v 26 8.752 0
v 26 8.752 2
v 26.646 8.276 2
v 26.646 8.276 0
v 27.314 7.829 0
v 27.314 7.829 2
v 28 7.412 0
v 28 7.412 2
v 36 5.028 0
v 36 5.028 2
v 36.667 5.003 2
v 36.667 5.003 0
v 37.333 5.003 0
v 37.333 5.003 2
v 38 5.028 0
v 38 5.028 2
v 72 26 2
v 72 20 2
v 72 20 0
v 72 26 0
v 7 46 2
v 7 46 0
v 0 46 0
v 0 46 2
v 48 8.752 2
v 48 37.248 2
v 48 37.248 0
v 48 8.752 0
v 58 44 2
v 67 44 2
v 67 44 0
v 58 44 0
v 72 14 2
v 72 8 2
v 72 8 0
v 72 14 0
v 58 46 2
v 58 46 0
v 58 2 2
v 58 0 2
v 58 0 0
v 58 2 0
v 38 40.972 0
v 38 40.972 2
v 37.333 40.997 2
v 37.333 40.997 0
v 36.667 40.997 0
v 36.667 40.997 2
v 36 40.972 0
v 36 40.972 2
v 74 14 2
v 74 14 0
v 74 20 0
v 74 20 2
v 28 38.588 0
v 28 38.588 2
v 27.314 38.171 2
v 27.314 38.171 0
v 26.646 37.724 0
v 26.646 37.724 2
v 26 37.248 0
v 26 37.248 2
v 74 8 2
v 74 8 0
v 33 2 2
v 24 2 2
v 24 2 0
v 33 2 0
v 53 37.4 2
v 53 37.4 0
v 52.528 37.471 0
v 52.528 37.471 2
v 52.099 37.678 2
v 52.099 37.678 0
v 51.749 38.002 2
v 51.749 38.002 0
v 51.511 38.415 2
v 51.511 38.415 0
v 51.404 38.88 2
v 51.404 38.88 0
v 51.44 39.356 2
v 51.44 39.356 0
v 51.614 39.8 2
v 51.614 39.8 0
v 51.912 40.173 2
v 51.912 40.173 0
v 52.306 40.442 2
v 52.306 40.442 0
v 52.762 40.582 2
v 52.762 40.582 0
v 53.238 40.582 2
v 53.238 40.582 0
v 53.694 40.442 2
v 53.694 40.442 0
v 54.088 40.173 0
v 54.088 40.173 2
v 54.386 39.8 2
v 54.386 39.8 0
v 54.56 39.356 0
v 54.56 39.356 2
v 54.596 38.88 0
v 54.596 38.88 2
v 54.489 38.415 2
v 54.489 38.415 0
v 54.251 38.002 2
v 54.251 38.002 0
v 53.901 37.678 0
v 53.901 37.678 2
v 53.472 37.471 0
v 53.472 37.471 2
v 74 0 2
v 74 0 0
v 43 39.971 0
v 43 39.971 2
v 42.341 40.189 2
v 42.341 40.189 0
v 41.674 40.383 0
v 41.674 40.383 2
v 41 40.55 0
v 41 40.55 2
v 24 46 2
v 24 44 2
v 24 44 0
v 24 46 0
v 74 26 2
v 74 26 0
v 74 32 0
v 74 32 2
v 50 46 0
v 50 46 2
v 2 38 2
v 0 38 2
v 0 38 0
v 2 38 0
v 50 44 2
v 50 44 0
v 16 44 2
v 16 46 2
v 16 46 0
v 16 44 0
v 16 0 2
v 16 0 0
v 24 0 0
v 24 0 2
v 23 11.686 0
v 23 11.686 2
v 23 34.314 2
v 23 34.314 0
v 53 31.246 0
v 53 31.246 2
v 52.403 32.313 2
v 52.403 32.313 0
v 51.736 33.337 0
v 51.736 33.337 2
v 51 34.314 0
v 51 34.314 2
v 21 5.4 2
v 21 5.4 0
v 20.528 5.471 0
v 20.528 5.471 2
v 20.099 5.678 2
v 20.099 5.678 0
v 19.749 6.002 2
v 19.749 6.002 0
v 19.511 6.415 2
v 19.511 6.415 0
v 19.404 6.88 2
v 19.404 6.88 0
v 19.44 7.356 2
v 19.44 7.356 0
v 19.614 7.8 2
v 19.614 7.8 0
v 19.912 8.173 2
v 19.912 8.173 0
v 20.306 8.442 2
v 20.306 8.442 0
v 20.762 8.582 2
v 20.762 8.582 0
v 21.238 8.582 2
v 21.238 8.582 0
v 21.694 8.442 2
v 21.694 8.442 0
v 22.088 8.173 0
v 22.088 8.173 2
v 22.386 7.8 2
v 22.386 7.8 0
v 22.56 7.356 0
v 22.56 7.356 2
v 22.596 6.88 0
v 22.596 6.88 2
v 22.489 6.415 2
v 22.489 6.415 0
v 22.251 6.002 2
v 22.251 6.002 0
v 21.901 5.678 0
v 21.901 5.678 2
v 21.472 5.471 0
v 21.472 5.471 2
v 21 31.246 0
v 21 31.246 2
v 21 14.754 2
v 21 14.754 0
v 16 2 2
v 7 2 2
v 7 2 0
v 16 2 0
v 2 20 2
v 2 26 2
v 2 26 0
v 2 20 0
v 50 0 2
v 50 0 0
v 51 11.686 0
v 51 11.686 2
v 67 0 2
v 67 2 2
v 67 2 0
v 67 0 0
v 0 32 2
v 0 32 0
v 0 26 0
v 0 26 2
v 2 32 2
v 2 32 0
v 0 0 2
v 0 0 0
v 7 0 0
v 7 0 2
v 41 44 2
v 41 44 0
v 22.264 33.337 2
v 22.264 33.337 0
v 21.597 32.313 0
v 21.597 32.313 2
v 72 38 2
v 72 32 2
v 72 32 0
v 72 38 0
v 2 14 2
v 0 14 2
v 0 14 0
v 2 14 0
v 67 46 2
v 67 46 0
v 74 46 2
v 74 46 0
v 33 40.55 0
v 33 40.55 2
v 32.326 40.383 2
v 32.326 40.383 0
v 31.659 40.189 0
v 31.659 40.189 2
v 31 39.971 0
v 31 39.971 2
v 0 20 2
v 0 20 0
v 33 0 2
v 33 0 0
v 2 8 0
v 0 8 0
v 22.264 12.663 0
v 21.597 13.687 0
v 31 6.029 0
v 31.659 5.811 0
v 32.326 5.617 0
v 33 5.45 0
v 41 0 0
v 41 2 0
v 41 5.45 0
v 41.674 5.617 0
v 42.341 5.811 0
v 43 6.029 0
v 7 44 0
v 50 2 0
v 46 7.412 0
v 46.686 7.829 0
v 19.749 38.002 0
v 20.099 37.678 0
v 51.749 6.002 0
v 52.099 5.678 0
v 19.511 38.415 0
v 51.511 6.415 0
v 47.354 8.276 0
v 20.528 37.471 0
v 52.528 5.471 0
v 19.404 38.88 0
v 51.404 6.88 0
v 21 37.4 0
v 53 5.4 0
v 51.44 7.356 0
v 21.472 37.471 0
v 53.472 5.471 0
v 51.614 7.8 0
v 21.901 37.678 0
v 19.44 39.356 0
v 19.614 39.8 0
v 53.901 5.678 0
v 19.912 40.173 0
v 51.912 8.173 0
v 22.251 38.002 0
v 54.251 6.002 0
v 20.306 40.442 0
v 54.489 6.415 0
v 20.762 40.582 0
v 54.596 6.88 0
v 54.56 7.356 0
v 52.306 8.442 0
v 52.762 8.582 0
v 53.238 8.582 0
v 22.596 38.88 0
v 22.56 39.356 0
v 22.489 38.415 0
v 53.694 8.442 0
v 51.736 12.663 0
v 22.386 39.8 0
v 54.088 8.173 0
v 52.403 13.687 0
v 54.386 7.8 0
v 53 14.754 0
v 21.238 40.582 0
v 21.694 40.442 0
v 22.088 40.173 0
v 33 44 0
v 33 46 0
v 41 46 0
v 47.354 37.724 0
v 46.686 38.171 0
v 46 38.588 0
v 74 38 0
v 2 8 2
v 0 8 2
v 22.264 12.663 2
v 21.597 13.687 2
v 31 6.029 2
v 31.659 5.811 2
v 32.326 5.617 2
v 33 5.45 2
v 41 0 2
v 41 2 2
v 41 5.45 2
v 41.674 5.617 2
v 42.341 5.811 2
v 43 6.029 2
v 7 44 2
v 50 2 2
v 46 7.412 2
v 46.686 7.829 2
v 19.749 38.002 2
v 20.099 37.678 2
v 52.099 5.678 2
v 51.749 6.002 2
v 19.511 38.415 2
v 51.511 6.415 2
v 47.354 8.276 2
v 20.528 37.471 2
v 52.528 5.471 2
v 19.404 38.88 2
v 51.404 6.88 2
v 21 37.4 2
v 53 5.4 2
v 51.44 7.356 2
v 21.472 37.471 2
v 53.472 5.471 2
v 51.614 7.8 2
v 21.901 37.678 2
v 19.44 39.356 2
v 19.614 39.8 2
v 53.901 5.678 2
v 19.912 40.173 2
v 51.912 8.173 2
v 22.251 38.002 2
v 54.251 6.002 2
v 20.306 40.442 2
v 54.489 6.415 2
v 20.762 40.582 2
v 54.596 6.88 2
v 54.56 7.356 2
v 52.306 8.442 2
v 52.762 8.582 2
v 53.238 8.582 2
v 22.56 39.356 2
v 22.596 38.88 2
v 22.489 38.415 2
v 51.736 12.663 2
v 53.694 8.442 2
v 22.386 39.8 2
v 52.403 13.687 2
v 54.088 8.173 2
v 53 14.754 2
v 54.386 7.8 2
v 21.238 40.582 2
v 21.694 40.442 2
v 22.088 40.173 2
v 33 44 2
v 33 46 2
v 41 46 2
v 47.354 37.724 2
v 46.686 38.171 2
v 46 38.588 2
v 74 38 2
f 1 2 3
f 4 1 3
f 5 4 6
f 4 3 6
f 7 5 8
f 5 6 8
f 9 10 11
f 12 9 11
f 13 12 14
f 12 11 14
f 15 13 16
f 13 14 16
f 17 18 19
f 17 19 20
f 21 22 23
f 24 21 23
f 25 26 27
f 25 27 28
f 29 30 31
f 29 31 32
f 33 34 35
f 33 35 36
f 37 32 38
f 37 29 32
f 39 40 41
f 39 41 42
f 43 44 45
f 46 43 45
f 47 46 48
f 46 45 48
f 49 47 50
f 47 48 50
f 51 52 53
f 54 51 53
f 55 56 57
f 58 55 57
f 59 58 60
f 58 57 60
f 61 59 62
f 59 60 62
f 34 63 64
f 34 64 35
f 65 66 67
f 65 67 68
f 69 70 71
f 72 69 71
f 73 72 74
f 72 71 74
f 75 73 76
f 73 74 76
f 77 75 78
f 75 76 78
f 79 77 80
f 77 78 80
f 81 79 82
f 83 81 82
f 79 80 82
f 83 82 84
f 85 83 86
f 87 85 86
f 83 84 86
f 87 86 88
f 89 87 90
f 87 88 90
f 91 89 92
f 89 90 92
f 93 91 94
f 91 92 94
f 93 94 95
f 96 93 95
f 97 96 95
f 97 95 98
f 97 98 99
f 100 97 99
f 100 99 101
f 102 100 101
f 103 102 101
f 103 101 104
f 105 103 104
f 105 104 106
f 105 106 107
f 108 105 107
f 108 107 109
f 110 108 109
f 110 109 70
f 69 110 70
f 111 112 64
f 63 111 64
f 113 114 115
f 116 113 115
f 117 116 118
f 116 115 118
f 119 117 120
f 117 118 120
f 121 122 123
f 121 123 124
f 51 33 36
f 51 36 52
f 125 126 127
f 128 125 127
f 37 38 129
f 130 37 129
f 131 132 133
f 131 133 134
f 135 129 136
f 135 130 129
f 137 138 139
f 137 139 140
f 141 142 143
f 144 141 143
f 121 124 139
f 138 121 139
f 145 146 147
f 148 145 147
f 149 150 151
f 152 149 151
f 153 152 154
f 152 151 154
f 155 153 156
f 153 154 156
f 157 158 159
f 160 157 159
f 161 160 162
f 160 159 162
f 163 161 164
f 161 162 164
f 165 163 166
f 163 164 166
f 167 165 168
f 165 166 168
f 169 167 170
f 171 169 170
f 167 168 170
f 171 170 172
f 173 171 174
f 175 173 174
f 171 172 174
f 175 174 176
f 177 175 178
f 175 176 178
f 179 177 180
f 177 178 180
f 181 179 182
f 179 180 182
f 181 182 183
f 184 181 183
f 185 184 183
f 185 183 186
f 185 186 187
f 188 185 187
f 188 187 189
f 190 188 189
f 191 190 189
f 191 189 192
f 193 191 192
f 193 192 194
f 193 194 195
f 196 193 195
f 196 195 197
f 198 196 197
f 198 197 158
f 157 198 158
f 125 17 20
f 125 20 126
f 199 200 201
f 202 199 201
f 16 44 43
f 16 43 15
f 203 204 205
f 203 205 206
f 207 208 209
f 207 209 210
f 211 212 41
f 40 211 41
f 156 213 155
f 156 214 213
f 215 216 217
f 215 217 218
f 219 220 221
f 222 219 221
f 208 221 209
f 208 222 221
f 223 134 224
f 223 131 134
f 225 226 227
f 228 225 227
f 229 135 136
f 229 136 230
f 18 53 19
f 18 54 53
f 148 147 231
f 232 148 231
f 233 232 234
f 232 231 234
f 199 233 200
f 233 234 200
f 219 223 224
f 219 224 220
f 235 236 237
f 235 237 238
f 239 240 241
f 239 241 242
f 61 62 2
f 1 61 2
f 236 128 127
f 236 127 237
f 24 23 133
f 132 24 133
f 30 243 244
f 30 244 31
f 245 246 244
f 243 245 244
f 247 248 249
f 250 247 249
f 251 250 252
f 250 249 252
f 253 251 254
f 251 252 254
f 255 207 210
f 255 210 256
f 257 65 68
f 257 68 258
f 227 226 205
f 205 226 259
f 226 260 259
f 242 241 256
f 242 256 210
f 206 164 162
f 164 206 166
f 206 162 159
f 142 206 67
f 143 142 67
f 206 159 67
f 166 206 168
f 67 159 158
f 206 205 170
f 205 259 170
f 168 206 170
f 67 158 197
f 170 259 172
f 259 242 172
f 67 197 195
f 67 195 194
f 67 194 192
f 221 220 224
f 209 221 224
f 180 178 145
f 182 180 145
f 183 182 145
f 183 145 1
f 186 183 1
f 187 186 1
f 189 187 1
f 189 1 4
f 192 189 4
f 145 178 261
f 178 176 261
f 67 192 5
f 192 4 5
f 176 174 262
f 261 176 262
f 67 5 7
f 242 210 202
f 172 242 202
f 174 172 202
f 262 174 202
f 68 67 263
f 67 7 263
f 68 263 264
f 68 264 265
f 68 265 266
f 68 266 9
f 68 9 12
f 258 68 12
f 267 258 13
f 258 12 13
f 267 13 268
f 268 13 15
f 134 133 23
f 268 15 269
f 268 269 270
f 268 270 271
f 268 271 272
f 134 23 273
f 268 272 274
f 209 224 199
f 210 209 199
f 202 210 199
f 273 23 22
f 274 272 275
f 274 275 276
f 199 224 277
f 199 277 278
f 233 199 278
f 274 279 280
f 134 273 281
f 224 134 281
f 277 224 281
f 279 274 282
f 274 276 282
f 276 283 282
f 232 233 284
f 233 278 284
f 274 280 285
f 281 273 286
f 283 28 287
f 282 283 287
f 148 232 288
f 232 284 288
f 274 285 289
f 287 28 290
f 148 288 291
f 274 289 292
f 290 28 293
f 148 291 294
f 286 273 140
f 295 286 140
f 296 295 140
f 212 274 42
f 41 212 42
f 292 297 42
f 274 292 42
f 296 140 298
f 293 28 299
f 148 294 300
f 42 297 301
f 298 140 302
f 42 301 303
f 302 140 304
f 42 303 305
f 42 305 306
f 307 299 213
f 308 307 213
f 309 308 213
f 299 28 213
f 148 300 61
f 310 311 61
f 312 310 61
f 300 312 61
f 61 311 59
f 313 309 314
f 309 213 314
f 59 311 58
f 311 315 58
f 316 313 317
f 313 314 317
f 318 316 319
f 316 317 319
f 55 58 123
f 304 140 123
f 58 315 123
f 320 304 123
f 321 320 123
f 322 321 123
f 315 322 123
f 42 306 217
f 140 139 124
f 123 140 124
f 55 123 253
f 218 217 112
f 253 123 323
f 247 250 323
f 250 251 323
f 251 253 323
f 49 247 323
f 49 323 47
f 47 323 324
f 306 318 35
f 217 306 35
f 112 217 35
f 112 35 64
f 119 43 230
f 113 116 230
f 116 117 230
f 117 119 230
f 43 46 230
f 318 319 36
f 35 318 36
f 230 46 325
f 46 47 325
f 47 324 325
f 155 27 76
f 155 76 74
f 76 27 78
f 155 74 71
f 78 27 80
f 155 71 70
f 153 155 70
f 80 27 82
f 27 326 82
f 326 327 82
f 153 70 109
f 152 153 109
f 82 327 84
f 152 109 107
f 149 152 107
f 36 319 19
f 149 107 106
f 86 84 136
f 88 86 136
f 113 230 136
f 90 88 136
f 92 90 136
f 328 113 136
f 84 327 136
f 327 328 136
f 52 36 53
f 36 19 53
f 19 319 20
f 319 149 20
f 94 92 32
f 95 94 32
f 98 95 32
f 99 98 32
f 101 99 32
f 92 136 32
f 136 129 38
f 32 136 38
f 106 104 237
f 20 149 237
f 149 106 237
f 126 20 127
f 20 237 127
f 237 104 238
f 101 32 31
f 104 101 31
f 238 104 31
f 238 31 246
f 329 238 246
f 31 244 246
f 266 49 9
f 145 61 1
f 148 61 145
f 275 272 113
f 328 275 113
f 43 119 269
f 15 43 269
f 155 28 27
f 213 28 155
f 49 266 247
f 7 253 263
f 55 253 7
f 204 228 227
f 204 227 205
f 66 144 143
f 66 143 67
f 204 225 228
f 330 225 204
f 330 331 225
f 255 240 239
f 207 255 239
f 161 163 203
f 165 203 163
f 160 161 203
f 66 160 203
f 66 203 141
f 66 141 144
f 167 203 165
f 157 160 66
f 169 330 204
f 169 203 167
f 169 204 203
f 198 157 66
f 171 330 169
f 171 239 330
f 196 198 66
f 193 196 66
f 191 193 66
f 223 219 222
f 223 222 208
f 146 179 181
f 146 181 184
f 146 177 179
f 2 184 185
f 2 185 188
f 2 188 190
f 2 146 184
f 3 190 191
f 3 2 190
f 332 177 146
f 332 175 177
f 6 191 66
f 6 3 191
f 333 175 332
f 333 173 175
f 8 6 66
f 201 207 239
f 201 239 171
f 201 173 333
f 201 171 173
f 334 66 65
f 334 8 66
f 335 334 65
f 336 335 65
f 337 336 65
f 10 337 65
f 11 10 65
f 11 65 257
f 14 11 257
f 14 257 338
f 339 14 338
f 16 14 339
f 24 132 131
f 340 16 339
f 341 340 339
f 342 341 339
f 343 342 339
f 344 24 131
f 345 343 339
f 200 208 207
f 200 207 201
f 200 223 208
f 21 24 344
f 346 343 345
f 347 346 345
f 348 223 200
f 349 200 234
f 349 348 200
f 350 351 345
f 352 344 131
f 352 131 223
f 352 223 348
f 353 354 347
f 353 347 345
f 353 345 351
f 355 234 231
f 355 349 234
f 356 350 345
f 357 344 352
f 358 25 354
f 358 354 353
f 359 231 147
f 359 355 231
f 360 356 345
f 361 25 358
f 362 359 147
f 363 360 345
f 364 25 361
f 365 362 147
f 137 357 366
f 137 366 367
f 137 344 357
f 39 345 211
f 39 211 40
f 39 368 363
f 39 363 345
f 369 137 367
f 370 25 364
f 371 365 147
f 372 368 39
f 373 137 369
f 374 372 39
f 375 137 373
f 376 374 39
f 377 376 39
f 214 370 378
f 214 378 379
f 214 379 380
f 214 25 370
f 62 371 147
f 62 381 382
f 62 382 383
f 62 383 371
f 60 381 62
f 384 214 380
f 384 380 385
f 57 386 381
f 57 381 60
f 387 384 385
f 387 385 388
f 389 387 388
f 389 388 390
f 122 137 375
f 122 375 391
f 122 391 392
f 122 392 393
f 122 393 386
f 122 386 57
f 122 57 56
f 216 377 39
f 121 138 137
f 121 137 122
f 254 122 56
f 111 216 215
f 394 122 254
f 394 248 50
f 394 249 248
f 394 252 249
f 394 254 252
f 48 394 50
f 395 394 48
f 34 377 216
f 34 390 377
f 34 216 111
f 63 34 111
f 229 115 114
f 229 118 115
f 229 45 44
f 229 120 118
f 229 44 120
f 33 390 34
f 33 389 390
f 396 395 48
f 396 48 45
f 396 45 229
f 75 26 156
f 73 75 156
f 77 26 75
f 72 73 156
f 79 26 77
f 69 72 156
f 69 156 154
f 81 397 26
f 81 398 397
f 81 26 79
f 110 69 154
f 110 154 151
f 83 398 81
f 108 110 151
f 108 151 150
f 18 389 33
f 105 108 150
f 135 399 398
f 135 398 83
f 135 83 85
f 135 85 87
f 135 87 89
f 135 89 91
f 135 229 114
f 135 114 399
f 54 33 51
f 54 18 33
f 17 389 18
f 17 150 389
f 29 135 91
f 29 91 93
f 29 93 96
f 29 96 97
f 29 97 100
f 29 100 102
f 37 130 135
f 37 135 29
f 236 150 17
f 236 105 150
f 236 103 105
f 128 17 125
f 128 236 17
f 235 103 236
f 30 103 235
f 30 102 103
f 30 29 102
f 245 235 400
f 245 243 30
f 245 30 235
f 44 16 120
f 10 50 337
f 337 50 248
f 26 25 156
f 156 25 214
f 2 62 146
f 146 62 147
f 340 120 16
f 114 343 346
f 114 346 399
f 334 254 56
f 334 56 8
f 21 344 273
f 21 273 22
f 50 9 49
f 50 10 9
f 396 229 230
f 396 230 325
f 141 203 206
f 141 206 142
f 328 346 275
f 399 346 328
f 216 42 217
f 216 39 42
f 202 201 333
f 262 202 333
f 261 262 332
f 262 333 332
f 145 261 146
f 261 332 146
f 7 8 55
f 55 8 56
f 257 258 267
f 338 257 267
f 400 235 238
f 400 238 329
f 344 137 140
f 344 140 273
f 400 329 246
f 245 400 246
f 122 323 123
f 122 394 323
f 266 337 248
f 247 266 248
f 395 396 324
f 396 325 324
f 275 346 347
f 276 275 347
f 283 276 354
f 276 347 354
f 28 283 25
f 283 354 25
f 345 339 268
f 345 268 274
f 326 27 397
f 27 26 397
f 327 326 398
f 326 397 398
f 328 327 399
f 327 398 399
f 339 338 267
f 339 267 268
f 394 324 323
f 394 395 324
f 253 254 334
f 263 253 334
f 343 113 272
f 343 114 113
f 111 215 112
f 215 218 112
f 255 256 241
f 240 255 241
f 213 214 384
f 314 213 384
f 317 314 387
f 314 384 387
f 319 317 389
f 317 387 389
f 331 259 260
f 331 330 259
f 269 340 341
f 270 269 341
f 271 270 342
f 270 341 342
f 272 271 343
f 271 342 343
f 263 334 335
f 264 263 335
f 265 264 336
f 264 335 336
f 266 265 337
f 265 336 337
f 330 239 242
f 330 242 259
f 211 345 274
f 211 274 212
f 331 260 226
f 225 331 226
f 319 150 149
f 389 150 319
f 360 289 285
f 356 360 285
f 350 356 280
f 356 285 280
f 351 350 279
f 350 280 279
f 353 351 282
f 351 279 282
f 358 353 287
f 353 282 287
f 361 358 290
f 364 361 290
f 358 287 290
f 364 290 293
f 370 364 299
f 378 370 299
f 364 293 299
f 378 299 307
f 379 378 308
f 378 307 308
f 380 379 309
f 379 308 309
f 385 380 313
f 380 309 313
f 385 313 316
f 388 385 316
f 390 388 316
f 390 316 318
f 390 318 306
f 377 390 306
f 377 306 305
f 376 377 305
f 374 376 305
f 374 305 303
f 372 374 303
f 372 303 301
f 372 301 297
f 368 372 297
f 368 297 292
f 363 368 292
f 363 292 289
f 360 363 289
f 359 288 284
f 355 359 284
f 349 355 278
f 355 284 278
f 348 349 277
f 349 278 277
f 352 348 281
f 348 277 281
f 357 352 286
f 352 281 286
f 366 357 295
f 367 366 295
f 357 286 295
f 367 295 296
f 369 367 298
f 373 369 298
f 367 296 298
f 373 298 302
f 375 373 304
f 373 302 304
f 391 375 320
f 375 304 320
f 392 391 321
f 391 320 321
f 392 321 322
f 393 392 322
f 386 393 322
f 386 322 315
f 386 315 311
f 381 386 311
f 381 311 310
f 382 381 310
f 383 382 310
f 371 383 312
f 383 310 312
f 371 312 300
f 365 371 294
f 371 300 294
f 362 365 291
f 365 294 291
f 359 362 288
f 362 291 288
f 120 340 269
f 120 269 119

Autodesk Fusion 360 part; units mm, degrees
sketch "スケッチ1" plane through (0, 0, 0) normal (0, 0, 1) x (1, 0, 0)
  line L0 (0, 0) -> (74, 0)
  line L1 (74, 0) -> (74, 46)
  line L2 (74, 46) -> (0, 46)
  line L3 (0, 46) -> (0, 0)
  dimension "d1" = 46
  dimension "d2" = 74
extrude "押し出し1" add sketch "スケッチ1" along normal blind 2
sketch "スケッチ2" plane through (0, 0, 2) normal (0, 0, 1) x (-1, 0, 0)
  line L0 (0, -46) -> (0, 0)
  line L1 (0, 0) -> (-74, 0)
  line L2 (-74, 0) -> (-74, -46)
  line L3 (-74, -46) -> (0, -46)
  circle A0 centre (-53, -39) radius 1.6
  circle A1 centre (-53, -39) radius 1.6
  circle A2 centre (-53, -7) radius 1.6
  circle A3 centre (-21, -7) radius 1.6
  circle A4 centre (-21, -39) radius 1.6
  dimension "d5" = 3.2
  dimension "d6" = 7
  dimension "d7" = 21
  dimension "d8" = 3.2
  dimension "d9" = 3.2
  dimension "d10" = 3.2
  dimension "d11" = 3.2
  dimension "d12" = 7
  dimension "d13" = 21
hole "穴1" at (21, 39, 2) at (53, 39, 2) at (53, 7, 2) at (21, 7, 2) direction (0, 0, -1) diameter 3.2 depth 16 tip angle 118
sketch "スケッチ3" plane through (0, 0, 2) normal (0, 0, 1) x (-1, 0, 0)
  circle A0 centre (-53, -7) radius 1.6
  circle A1 centre (-21, -39) radius 1.6
  circle A2 centre (-53, -39) radius 1.6
  circle A3 centre (-21, -7) radius 1.6
  line L0 (0, -46) -> (0, 0)
  line L1 (0, 0) -> (-74, 0)
  line L2 (-74, 0) -> (-74, -46)
  line L3 (-74, -46) -> (0, -46)
  line L4 (-58, -46) -> (-67, -46)
  line L5 (-67, -46) -> (-67, -44)
  line L6 (-67, -44) -> (-58, -44)
  line L7 (-58, -44) -> (-58, -46)
  line L8 (-50, -46) -> (-50, -44)
  line L9 (-41, -46) -> (-50, -46)
  line L10 (-50, -44) -> (-41, -44)
  line L11 (-41, -44) -> (-41, -46)
  line L12 (-33, -46) -> (-33, -44)
  line L13 (-24, -46) -> (-33, -46)
  line L14 (-33, -44) -> (-24, -44)
  line L15 (-24, -44) -> (-24, -46)
  line L16 (-16, -46) -> (-16, -44)
  line L17 (-7, -46) -> (-16, -46)
  line L18 (-16, -44) -> (-7, -44)
  line L19 (-7, -44) -> (-7, -46)
  line L20 (0, -38) -> (-2, -38)
  line L21 (-2, -38) -> (-2, -32)
  line L22 (-2, -32) -> (0, -32)
  line L23 (0, -32) -> (0, -38)
  line L24 (-2, -20) -> (0, -20)
  line L25 (0, -20) -> (0, -26)
  line L26 (-2, -26) -> (-2, -20)
  line L27 (0, -26) -> (-2, -26)
  line L28 (-2, -8) -> (0, -8)
  line L29 (0, -8) -> (0, -14)
  line L30 (-2, -14) -> (-2, -8)
  line L31 (0, -14) -> (-2, -14)
  line L32 (-72, -8) -> (-72, -14)
  line L33 (-72, -38) -> (-74, -38)
  line L34 (-72, -32) -> (-72, -38)
  line L35 (-74, -26) -> (-74, -20)
  line L36 (-74, -32) -> (-72, -32)
  line L37 (-74, -20) -> (-72, -20)
  line L38 (-72, -20) -> (-72, -26)
  line L39 (-74, -14) -> (-74, -8)
  line L40 (-72, -26) -> (-74, -26)
  line L41 (-74, -38) -> (-74, -32)
  line L42 (-74, -8) -> (-72, -8)
  line L43 (-72, -14) -> (-74, -14)
  line L44 (-144, -8) -> (-144, -14)
  line L45 (-144, -38) -> (-146, -38)
  line L46 (-144, -32) -> (-144, -38)
  line L47 (-146, -26) -> (-146, -20)
  line L48 (-146, -32) -> (-144, -32)
  line L49 (-146, -20) -> (-144, -20)
  line L50 (-144, -20) -> (-144, -26)
  line L51 (-146, -14) -> (-146, -8)
  line L52 (-144, -26) -> (-146, -26)
  line L53 (-146, -38) -> (-146, -32)
  line L54 (-146, -8) -> (-144, -8)
  line L55 (-144, -14) -> (-146, -14)
  line L56 (-41, 0) -> (-41, -2)
  line L57 (-67, 0) -> (-58, 0)
  line L58 (-67, -2) -> (-67, 0)
  line L59 (-41, -2) -> (-50, -2)
  line L60 (-7, 0) -> (-7, -2)
  line L61 (-24, 0) -> (-24, -2)
  line L62 (-33, 0) -> (-24, 0)
  line L63 (-50, -2) -> (-50, 0)
  line L64 (-24, -2) -> (-33, -2)
  line L65 (-7, -2) -> (-16, -2)
  line L66 (-58, -2) -> (-67, -2)
  line L67 (-16, -2) -> (-16, 0)
  line L68 (-50, 0) -> (-41, 0)
  line L69 (-58, 0) -> (-58, -2)
  line L70 (-16, 0) -> (-7, 0)
  line L71 (-33, -2) -> (-33, 0)
  line L72 (-41, 44) -> (-41, 42)
  line L73 (-67, 44) -> (-58, 44)
  line L74 (-67, 42) -> (-67, 44)
  line L75 (-41, 42) -> (-50, 42)
  line L76 (-7, 44) -> (-7, 42)
  line L77 (-24, 44) -> (-24, 42)
  line L78 (-33, 44) -> (-24, 44)
  line L79 (-50, 42) -> (-50, 44)
  line L80 (-24, 42) -> (-33, 42)
  line L81 (-7, 42) -> (-16, 42)
  line L82 (-58, 42) -> (-67, 42)
  line L83 (-16, 42) -> (-16, 44)
  line L84 (-50, 44) -> (-41, 44)
  line L85 (-58, 44) -> (-58, 42)
  line L86 (-16, 44) -> (-7, 44)
  line L87 (-33, 42) -> (-33, 44)
  dimension "d17" = 9
  dimension "d18" = 2
  dimension "d19" = 7
  dimension "d22" = 17
  dimension "d23" = 0
  dimension "d24" = 6
  dimension "d25" = 2
  dimension "d26" = 8
  dimension "d29" = 0
  dimension "d30" = 12
  dimension "d33" = -72
  dimension "d34" = 0
  dimension "d37" = 0
  dimension "d38" = 44
extrude "押し出し2" cut sketch "スケッチ3" against normal blind 2 contours L0 L20 L21 L22 L23 | L3 L16 L17 L18 L19 | L0 L24 L25 L26 L27 | L3 L12 L13 L14 L15 | L0 L28 L29 L30 L31 | L3 L8 L9 L10 L11 | L3 L4 L5 L6 L7 | L1 L60 L65 L67 L70 | L1 L61 L62 L64 L71 | L2 L33 L34 L36 L41 | L1 L56 L59 L63 L68 | L2 L35 L37 L38 L40 | L1 L57 L58 L66 L69 | L2 L32 L39 L42 L43
sketch "スケッチ4" plane through (0, 0, 2) normal (0, 0, 1) x (-1, 0, 0)
  line L0 (-50, -2) -> (-50, 0)
  line L1 (-50, 0) -> (-58, 0)
  line L2 (-58, 0) -> (-58, -2)
  line L3 (-58, -2) -> (-67, -2)
  line L4 (-67, -2) -> (-67, 0)
  line L5 (-67, 0) -> (-74, 0)
  line L6 (-74, 0) -> (-74, -8)
  line L7 (-74, -8) -> (-72, -8)
  line L8 (-72, -8) -> (-72, -14)
  line L9 (-72, -14) -> (-74, -14)
  line L10 (-74, -14) -> (-74, -20)
  line L11 (-74, -20) -> (-72, -20)
  line L12 (-72, -20) -> (-72, -26)
  line L13 (-72, -26) -> (-74, -26)
  line L14 (-74, -26) -> (-74, -32)
  line L15 (-74, -32) -> (-72, -32)
  line L16 (-72, -32) -> (-72, -38)
  line L17 (-72, -38) -> (-74, -38)
  line L18 (-74, -38) -> (-74, -46)
  line L19 (-74, -46) -> (-67, -46)
  line L20 (-67, -46) -> (-67, -44)
  line L21 (-67, -44) -> (-58, -44)
  line L22 (-58, -44) -> (-58, -46)
  line L23 (-58, -46) -> (-50, -46)
  line L24 (-50, -46) -> (-50, -44)
  line L25 (-50, -44) -> (-41, -44)
  line L26 (-41, -44) -> (-41, -46)
  line L27 (-41, -46) -> (-33, -46)
  line L28 (-33, -46) -> (-33, -44)
  line L29 (-33, -44) -> (-24, -44)
  line L30 (-24, -44) -> (-24, -46)
  line L31 (-24, -46) -> (-16, -46)
  line L32 (-16, -46) -> (-16, -44)
  line L33 (-16, -44) -> (-7, -44)
  line L34 (-7, -44) -> (-7, -46)
  line L35 (-7, -46) -> (0, -46)
  line L36 (0, -46) -> (0, -38)
  line L37 (0, -38) -> (-2, -38)
  line L38 (-2, -38) -> (-2, -32)
  line L39 (-2, -32) -> (0, -32)
  line L40 (0, -32) -> (0, -26)
  line L41 (0, -26) -> (-2, -26)
  line L42 (-2, -26) -> (-2, -20)
  line L43 (-2, -20) -> (0, -20)
  line L44 (0, -20) -> (0, -14)
  line L45 (0, -14) -> (-2, -14)
  line L46 (-2, -14) -> (-2, -8)
  line L47 (-2, -8) -> (0, -8)
  line L48 (0, -8) -> (0, 0)
  line L49 (0, 0) -> (-7, 0)
  line L50 (-7, 0) -> (-7, -2)
  line L51 (-7, -2) -> (-16, -2)
  line L52 (-16, -2) -> (-16, 0)
  line L53 (-16, 0) -> (-24, 0)
  line L54 (-24, 0) -> (-24, -2)
  line L55 (-24, -2) -> (-33, -2)
  line L56 (-33, -2) -> (-33, 0)
  line L57 (-33, 0) -> (-41, 0)
  line L58 (-41, 0) -> (-41, -2)
  line L59 (-41, -2) -> (-50, -2)
  circle A0 centre (-53, -7) radius 1.6
  circle A1 centre (-21, -39) radius 1.6
  circle A2 centre (-53, -39) radius 1.6
  circle A3 centre (-21, -7) radius 1.6
  circle A4 centre (-37, -23) radius 18
  line L60 (-36, -42) -> (-38, -42)
  line L61 (-38, -42) -> (-38, -4)
  line L62 (-38, -4) -> (-36, -4)
  line L63 (-36, -4) -> (-36, -42)
  line L64 (-41, -42) -> (-43, -42)
  line L65 (-43, -42) -> (-43, -5)
  line L66 (-43, -5) -> (-41, -5)
  line L67 (-41, -5) -> (-41, -42)
  line L68 (-46, -40) -> (-48, -40)
  line L69 (-48, -40) -> (-48, -6)
  line L70 (-48, -6) -> (-46, -6)
  line L71 (-46, -6) -> (-46, -40)
  line L72 (-51, -36) -> (-53, -36)
  line L73 (-53, -36) -> (-53, -11)
  line L74 (-53, -11) -> (-51, -11)
  line L75 (-51, -11) -> (-51, -36)
  line L76 (-33, -42) -> (-31, -42)
  line L77 (-31, -42) -> (-31, -4)
  line L78 (-31, -4) -> (-33, -4)
  line L79 (-33, -4) -> (-33, -42)
  line L80 (-28, -40) -> (-26, -40)
  line L81 (-26, -40) -> (-26, -6)
  line L82 (-26, -6) -> (-28, -6)
  line L83 (-28, -6) -> (-28, -40)
  line L84 (-23, -36) -> (-21, -36)
  line L85 (-21, -36) -> (-21, -11)
  line L86 (-21, -11) -> (-23, -11)
  line L87 (-23, -11) -> (-23, -36)
extrude "押し出し3" cut sketch "スケッチ4" against normal blind 2 contours A4 L85 L87 | A4 L81 L83 | A4 L77 L79 | A4 L61 L63 | A4 L65 L67 | A4 L69 L71 | A4 L73 L75
sketch "スケッチ5" plane through (0, 0, 2) normal (0, 0, 1) x (-1, 0, 0)
  line L0 (-33, -40.5499) -> (-33, -5.4501)
  arc A0 (-31, -6.0294) -> (-33, -5.4501) centre (-37, -23) ccw
  line L1 (-31, -6.0294) -> (-31, -39.9706)
  arc A1 (-33, -40.5499) -> (-31, -39.9706) centre (-37, -23) ccw
  line L2 (-51, -11.6863) -> (-51, -34.3137)
  arc A2 (-53, -31.2462) -> (-51, -34.3137) centre (-37, -23) ccw
  line L3 (-53, -31.2462) -> (-53, -14.7538)
  arc A3 (-51, -11.6863) -> (-53, -14.7538) centre (-37, -23) ccw
  line L4 (-36, -5.0278) -> (-36, -40.9722)
  arc A4 (-38, -40.9722) -> (-36, -40.9722) centre (-37, -23) ccw
  line L5 (-38, -40.9722) -> (-38, -5.0278)
  arc A5 (-36, -5.0278) -> (-38, -5.0278) centre (-37, -23) ccw
  line L6 (-28, -38.5885) -> (-28, -7.4115)
  arc A6 (-26, -8.7522) -> (-28, -7.4115) centre (-37, -23) ccw
  line L7 (-26, -8.7522) -> (-26, -37.2478)
  arc A7 (-28, -38.5885) -> (-26, -37.2478) centre (-37, -23) ccw
  line L8 (-46, -7.4115) -> (-46, -38.5885)
  arc A8 (-48, -37.2478) -> (-46, -38.5885) centre (-37, -23) ccw
  line L9 (-48, -37.2478) -> (-48, -8.7522)
  arc A9 (-46, -7.4115) -> (-48, -8.7522) centre (-37, -23) ccw
  line L10 (-41, -5.4501) -> (-41, -40.5499)
  arc A10 (-43, -39.9706) -> (-41, -40.5499) centre (-37, -23) ccw
  line L11 (-43, -39.9706) -> (-43, -6.0294)
  arc A11 (-41, -5.4501) -> (-43, -6.0294) centre (-37, -23) ccw
  line L12 (-23, -34.3137) -> (-23, -11.6863)
  arc A12 (-21, -14.7538) -> (-23, -11.6863) centre (-37, -23) ccw
  line L13 (-21, -14.7538) -> (-21, -31.2462)
  arc A13 (-23, -34.3137) -> (-21, -31.2462) centre (-37, -23) ccw
  line L14 (-50, -2) -> (-50, 0)
  line L15 (-50, 0) -> (-58, 0)
  line L16 (-58, 0) -> (-58, -2)
  line L17 (-58, -2) -> (-67, -2)
  line L18 (-67, -2) -> (-67, 0)
  line L19 (-67, 0) -> (-74, 0)
  line L20 (-74, 0) -> (-74, -8)
  line L21 (-74, -8) -> (-72, -8)
  line L22 (-72, -8) -> (-72, -14)
  line L23 (-72, -14) -> (-74, -14)
  line L24 (-74, -14) -> (-74, -20)
  line L25 (-74, -20) -> (-72, -20)
  line L26 (-72, -20) -> (-72, -26)
  line L27 (-72, -26) -> (-74, -26)
  line L28 (-74, -26) -> (-74, -32)
  line L29 (-74, -32) -> (-72, -32)
  line L30 (-72, -32) -> (-72, -38)
  line L31 (-72, -38) -> (-74, -38)
  line L32 (-74, -38) -> (-74, -46)
  line L33 (-74, -46) -> (-67, -46)
  line L34 (-67, -46) -> (-67, -44)
  line L35 (-67, -44) -> (-58, -44)
  line L36 (-58, -44) -> (-58, -46)
  line L37 (-58, -46) -> (-50, -46)
  line L38 (-50, -46) -> (-50, -44)
  line L39 (-50, -44) -> (-41, -44)
  line L40 (-41, -44) -> (-41, -46)
  line L41 (-41, -46) -> (-33, -46)
  line L42 (-33, -46) -> (-33, -44)
  line L43 (-33, -44) -> (-24, -44)
  line L44 (-24, -44) -> (-24, -46)
  line L45 (-24, -46) -> (-16, -46)
  line L46 (-16, -46) -> (-16, -44)
  line L47 (-16, -44) -> (-7, -44)
  line L48 (-7, -44) -> (-7, -46)
  line L49 (-7, -46) -> (0, -46)
  line L50 (0, -46) -> (0, -38)
  line L51 (0, -38) -> (-2, -38)
  line L52 (-2, -38) -> (-2, -32)
  line L53 (-2, -32) -> (0, -32)
  line L54 (0, -32) -> (0, -26)
  line L55 (0, -26) -> (-2, -26)
  line L56 (-2, -26) -> (-2, -20)
  line L57 (-2, -20) -> (0, -20)
  line L58 (0, -20) -> (0, -14)
  line L59 (0, -14) -> (-2, -14)
  line L60 (-2, -14) -> (-2, -8)
  line L61 (-2, -8) -> (0, -8)
  line L62 (0, -8) -> (0, 0)
  line L63 (0, 0) -> (-7, 0)
  line L64 (-7, 0) -> (-7, -2)
  line L65 (-7, -2) -> (-16, -2)
  line L66 (-16, -2) -> (-16, 0)
  line L67 (-16, 0) -> (-24, 0)
  line L68 (-24, 0) -> (-24, -2)
  line L69 (-24, -2) -> (-33, -2)
  line L70 (-33, -2) -> (-33, 0)
  line L71 (-33, 0) -> (-41, 0)
  line L72 (-41, 0) -> (-41, -2)
  line L73 (-41, -2) -> (-50, -2)
  circle A14 centre (-53, -7) radius 1.6
  circle A15 centre (-21, -39) radius 1.6
  circle A16 centre (-53, -39) radius 1.6
  circle A17 centre (-21, -7) radius 1.6
